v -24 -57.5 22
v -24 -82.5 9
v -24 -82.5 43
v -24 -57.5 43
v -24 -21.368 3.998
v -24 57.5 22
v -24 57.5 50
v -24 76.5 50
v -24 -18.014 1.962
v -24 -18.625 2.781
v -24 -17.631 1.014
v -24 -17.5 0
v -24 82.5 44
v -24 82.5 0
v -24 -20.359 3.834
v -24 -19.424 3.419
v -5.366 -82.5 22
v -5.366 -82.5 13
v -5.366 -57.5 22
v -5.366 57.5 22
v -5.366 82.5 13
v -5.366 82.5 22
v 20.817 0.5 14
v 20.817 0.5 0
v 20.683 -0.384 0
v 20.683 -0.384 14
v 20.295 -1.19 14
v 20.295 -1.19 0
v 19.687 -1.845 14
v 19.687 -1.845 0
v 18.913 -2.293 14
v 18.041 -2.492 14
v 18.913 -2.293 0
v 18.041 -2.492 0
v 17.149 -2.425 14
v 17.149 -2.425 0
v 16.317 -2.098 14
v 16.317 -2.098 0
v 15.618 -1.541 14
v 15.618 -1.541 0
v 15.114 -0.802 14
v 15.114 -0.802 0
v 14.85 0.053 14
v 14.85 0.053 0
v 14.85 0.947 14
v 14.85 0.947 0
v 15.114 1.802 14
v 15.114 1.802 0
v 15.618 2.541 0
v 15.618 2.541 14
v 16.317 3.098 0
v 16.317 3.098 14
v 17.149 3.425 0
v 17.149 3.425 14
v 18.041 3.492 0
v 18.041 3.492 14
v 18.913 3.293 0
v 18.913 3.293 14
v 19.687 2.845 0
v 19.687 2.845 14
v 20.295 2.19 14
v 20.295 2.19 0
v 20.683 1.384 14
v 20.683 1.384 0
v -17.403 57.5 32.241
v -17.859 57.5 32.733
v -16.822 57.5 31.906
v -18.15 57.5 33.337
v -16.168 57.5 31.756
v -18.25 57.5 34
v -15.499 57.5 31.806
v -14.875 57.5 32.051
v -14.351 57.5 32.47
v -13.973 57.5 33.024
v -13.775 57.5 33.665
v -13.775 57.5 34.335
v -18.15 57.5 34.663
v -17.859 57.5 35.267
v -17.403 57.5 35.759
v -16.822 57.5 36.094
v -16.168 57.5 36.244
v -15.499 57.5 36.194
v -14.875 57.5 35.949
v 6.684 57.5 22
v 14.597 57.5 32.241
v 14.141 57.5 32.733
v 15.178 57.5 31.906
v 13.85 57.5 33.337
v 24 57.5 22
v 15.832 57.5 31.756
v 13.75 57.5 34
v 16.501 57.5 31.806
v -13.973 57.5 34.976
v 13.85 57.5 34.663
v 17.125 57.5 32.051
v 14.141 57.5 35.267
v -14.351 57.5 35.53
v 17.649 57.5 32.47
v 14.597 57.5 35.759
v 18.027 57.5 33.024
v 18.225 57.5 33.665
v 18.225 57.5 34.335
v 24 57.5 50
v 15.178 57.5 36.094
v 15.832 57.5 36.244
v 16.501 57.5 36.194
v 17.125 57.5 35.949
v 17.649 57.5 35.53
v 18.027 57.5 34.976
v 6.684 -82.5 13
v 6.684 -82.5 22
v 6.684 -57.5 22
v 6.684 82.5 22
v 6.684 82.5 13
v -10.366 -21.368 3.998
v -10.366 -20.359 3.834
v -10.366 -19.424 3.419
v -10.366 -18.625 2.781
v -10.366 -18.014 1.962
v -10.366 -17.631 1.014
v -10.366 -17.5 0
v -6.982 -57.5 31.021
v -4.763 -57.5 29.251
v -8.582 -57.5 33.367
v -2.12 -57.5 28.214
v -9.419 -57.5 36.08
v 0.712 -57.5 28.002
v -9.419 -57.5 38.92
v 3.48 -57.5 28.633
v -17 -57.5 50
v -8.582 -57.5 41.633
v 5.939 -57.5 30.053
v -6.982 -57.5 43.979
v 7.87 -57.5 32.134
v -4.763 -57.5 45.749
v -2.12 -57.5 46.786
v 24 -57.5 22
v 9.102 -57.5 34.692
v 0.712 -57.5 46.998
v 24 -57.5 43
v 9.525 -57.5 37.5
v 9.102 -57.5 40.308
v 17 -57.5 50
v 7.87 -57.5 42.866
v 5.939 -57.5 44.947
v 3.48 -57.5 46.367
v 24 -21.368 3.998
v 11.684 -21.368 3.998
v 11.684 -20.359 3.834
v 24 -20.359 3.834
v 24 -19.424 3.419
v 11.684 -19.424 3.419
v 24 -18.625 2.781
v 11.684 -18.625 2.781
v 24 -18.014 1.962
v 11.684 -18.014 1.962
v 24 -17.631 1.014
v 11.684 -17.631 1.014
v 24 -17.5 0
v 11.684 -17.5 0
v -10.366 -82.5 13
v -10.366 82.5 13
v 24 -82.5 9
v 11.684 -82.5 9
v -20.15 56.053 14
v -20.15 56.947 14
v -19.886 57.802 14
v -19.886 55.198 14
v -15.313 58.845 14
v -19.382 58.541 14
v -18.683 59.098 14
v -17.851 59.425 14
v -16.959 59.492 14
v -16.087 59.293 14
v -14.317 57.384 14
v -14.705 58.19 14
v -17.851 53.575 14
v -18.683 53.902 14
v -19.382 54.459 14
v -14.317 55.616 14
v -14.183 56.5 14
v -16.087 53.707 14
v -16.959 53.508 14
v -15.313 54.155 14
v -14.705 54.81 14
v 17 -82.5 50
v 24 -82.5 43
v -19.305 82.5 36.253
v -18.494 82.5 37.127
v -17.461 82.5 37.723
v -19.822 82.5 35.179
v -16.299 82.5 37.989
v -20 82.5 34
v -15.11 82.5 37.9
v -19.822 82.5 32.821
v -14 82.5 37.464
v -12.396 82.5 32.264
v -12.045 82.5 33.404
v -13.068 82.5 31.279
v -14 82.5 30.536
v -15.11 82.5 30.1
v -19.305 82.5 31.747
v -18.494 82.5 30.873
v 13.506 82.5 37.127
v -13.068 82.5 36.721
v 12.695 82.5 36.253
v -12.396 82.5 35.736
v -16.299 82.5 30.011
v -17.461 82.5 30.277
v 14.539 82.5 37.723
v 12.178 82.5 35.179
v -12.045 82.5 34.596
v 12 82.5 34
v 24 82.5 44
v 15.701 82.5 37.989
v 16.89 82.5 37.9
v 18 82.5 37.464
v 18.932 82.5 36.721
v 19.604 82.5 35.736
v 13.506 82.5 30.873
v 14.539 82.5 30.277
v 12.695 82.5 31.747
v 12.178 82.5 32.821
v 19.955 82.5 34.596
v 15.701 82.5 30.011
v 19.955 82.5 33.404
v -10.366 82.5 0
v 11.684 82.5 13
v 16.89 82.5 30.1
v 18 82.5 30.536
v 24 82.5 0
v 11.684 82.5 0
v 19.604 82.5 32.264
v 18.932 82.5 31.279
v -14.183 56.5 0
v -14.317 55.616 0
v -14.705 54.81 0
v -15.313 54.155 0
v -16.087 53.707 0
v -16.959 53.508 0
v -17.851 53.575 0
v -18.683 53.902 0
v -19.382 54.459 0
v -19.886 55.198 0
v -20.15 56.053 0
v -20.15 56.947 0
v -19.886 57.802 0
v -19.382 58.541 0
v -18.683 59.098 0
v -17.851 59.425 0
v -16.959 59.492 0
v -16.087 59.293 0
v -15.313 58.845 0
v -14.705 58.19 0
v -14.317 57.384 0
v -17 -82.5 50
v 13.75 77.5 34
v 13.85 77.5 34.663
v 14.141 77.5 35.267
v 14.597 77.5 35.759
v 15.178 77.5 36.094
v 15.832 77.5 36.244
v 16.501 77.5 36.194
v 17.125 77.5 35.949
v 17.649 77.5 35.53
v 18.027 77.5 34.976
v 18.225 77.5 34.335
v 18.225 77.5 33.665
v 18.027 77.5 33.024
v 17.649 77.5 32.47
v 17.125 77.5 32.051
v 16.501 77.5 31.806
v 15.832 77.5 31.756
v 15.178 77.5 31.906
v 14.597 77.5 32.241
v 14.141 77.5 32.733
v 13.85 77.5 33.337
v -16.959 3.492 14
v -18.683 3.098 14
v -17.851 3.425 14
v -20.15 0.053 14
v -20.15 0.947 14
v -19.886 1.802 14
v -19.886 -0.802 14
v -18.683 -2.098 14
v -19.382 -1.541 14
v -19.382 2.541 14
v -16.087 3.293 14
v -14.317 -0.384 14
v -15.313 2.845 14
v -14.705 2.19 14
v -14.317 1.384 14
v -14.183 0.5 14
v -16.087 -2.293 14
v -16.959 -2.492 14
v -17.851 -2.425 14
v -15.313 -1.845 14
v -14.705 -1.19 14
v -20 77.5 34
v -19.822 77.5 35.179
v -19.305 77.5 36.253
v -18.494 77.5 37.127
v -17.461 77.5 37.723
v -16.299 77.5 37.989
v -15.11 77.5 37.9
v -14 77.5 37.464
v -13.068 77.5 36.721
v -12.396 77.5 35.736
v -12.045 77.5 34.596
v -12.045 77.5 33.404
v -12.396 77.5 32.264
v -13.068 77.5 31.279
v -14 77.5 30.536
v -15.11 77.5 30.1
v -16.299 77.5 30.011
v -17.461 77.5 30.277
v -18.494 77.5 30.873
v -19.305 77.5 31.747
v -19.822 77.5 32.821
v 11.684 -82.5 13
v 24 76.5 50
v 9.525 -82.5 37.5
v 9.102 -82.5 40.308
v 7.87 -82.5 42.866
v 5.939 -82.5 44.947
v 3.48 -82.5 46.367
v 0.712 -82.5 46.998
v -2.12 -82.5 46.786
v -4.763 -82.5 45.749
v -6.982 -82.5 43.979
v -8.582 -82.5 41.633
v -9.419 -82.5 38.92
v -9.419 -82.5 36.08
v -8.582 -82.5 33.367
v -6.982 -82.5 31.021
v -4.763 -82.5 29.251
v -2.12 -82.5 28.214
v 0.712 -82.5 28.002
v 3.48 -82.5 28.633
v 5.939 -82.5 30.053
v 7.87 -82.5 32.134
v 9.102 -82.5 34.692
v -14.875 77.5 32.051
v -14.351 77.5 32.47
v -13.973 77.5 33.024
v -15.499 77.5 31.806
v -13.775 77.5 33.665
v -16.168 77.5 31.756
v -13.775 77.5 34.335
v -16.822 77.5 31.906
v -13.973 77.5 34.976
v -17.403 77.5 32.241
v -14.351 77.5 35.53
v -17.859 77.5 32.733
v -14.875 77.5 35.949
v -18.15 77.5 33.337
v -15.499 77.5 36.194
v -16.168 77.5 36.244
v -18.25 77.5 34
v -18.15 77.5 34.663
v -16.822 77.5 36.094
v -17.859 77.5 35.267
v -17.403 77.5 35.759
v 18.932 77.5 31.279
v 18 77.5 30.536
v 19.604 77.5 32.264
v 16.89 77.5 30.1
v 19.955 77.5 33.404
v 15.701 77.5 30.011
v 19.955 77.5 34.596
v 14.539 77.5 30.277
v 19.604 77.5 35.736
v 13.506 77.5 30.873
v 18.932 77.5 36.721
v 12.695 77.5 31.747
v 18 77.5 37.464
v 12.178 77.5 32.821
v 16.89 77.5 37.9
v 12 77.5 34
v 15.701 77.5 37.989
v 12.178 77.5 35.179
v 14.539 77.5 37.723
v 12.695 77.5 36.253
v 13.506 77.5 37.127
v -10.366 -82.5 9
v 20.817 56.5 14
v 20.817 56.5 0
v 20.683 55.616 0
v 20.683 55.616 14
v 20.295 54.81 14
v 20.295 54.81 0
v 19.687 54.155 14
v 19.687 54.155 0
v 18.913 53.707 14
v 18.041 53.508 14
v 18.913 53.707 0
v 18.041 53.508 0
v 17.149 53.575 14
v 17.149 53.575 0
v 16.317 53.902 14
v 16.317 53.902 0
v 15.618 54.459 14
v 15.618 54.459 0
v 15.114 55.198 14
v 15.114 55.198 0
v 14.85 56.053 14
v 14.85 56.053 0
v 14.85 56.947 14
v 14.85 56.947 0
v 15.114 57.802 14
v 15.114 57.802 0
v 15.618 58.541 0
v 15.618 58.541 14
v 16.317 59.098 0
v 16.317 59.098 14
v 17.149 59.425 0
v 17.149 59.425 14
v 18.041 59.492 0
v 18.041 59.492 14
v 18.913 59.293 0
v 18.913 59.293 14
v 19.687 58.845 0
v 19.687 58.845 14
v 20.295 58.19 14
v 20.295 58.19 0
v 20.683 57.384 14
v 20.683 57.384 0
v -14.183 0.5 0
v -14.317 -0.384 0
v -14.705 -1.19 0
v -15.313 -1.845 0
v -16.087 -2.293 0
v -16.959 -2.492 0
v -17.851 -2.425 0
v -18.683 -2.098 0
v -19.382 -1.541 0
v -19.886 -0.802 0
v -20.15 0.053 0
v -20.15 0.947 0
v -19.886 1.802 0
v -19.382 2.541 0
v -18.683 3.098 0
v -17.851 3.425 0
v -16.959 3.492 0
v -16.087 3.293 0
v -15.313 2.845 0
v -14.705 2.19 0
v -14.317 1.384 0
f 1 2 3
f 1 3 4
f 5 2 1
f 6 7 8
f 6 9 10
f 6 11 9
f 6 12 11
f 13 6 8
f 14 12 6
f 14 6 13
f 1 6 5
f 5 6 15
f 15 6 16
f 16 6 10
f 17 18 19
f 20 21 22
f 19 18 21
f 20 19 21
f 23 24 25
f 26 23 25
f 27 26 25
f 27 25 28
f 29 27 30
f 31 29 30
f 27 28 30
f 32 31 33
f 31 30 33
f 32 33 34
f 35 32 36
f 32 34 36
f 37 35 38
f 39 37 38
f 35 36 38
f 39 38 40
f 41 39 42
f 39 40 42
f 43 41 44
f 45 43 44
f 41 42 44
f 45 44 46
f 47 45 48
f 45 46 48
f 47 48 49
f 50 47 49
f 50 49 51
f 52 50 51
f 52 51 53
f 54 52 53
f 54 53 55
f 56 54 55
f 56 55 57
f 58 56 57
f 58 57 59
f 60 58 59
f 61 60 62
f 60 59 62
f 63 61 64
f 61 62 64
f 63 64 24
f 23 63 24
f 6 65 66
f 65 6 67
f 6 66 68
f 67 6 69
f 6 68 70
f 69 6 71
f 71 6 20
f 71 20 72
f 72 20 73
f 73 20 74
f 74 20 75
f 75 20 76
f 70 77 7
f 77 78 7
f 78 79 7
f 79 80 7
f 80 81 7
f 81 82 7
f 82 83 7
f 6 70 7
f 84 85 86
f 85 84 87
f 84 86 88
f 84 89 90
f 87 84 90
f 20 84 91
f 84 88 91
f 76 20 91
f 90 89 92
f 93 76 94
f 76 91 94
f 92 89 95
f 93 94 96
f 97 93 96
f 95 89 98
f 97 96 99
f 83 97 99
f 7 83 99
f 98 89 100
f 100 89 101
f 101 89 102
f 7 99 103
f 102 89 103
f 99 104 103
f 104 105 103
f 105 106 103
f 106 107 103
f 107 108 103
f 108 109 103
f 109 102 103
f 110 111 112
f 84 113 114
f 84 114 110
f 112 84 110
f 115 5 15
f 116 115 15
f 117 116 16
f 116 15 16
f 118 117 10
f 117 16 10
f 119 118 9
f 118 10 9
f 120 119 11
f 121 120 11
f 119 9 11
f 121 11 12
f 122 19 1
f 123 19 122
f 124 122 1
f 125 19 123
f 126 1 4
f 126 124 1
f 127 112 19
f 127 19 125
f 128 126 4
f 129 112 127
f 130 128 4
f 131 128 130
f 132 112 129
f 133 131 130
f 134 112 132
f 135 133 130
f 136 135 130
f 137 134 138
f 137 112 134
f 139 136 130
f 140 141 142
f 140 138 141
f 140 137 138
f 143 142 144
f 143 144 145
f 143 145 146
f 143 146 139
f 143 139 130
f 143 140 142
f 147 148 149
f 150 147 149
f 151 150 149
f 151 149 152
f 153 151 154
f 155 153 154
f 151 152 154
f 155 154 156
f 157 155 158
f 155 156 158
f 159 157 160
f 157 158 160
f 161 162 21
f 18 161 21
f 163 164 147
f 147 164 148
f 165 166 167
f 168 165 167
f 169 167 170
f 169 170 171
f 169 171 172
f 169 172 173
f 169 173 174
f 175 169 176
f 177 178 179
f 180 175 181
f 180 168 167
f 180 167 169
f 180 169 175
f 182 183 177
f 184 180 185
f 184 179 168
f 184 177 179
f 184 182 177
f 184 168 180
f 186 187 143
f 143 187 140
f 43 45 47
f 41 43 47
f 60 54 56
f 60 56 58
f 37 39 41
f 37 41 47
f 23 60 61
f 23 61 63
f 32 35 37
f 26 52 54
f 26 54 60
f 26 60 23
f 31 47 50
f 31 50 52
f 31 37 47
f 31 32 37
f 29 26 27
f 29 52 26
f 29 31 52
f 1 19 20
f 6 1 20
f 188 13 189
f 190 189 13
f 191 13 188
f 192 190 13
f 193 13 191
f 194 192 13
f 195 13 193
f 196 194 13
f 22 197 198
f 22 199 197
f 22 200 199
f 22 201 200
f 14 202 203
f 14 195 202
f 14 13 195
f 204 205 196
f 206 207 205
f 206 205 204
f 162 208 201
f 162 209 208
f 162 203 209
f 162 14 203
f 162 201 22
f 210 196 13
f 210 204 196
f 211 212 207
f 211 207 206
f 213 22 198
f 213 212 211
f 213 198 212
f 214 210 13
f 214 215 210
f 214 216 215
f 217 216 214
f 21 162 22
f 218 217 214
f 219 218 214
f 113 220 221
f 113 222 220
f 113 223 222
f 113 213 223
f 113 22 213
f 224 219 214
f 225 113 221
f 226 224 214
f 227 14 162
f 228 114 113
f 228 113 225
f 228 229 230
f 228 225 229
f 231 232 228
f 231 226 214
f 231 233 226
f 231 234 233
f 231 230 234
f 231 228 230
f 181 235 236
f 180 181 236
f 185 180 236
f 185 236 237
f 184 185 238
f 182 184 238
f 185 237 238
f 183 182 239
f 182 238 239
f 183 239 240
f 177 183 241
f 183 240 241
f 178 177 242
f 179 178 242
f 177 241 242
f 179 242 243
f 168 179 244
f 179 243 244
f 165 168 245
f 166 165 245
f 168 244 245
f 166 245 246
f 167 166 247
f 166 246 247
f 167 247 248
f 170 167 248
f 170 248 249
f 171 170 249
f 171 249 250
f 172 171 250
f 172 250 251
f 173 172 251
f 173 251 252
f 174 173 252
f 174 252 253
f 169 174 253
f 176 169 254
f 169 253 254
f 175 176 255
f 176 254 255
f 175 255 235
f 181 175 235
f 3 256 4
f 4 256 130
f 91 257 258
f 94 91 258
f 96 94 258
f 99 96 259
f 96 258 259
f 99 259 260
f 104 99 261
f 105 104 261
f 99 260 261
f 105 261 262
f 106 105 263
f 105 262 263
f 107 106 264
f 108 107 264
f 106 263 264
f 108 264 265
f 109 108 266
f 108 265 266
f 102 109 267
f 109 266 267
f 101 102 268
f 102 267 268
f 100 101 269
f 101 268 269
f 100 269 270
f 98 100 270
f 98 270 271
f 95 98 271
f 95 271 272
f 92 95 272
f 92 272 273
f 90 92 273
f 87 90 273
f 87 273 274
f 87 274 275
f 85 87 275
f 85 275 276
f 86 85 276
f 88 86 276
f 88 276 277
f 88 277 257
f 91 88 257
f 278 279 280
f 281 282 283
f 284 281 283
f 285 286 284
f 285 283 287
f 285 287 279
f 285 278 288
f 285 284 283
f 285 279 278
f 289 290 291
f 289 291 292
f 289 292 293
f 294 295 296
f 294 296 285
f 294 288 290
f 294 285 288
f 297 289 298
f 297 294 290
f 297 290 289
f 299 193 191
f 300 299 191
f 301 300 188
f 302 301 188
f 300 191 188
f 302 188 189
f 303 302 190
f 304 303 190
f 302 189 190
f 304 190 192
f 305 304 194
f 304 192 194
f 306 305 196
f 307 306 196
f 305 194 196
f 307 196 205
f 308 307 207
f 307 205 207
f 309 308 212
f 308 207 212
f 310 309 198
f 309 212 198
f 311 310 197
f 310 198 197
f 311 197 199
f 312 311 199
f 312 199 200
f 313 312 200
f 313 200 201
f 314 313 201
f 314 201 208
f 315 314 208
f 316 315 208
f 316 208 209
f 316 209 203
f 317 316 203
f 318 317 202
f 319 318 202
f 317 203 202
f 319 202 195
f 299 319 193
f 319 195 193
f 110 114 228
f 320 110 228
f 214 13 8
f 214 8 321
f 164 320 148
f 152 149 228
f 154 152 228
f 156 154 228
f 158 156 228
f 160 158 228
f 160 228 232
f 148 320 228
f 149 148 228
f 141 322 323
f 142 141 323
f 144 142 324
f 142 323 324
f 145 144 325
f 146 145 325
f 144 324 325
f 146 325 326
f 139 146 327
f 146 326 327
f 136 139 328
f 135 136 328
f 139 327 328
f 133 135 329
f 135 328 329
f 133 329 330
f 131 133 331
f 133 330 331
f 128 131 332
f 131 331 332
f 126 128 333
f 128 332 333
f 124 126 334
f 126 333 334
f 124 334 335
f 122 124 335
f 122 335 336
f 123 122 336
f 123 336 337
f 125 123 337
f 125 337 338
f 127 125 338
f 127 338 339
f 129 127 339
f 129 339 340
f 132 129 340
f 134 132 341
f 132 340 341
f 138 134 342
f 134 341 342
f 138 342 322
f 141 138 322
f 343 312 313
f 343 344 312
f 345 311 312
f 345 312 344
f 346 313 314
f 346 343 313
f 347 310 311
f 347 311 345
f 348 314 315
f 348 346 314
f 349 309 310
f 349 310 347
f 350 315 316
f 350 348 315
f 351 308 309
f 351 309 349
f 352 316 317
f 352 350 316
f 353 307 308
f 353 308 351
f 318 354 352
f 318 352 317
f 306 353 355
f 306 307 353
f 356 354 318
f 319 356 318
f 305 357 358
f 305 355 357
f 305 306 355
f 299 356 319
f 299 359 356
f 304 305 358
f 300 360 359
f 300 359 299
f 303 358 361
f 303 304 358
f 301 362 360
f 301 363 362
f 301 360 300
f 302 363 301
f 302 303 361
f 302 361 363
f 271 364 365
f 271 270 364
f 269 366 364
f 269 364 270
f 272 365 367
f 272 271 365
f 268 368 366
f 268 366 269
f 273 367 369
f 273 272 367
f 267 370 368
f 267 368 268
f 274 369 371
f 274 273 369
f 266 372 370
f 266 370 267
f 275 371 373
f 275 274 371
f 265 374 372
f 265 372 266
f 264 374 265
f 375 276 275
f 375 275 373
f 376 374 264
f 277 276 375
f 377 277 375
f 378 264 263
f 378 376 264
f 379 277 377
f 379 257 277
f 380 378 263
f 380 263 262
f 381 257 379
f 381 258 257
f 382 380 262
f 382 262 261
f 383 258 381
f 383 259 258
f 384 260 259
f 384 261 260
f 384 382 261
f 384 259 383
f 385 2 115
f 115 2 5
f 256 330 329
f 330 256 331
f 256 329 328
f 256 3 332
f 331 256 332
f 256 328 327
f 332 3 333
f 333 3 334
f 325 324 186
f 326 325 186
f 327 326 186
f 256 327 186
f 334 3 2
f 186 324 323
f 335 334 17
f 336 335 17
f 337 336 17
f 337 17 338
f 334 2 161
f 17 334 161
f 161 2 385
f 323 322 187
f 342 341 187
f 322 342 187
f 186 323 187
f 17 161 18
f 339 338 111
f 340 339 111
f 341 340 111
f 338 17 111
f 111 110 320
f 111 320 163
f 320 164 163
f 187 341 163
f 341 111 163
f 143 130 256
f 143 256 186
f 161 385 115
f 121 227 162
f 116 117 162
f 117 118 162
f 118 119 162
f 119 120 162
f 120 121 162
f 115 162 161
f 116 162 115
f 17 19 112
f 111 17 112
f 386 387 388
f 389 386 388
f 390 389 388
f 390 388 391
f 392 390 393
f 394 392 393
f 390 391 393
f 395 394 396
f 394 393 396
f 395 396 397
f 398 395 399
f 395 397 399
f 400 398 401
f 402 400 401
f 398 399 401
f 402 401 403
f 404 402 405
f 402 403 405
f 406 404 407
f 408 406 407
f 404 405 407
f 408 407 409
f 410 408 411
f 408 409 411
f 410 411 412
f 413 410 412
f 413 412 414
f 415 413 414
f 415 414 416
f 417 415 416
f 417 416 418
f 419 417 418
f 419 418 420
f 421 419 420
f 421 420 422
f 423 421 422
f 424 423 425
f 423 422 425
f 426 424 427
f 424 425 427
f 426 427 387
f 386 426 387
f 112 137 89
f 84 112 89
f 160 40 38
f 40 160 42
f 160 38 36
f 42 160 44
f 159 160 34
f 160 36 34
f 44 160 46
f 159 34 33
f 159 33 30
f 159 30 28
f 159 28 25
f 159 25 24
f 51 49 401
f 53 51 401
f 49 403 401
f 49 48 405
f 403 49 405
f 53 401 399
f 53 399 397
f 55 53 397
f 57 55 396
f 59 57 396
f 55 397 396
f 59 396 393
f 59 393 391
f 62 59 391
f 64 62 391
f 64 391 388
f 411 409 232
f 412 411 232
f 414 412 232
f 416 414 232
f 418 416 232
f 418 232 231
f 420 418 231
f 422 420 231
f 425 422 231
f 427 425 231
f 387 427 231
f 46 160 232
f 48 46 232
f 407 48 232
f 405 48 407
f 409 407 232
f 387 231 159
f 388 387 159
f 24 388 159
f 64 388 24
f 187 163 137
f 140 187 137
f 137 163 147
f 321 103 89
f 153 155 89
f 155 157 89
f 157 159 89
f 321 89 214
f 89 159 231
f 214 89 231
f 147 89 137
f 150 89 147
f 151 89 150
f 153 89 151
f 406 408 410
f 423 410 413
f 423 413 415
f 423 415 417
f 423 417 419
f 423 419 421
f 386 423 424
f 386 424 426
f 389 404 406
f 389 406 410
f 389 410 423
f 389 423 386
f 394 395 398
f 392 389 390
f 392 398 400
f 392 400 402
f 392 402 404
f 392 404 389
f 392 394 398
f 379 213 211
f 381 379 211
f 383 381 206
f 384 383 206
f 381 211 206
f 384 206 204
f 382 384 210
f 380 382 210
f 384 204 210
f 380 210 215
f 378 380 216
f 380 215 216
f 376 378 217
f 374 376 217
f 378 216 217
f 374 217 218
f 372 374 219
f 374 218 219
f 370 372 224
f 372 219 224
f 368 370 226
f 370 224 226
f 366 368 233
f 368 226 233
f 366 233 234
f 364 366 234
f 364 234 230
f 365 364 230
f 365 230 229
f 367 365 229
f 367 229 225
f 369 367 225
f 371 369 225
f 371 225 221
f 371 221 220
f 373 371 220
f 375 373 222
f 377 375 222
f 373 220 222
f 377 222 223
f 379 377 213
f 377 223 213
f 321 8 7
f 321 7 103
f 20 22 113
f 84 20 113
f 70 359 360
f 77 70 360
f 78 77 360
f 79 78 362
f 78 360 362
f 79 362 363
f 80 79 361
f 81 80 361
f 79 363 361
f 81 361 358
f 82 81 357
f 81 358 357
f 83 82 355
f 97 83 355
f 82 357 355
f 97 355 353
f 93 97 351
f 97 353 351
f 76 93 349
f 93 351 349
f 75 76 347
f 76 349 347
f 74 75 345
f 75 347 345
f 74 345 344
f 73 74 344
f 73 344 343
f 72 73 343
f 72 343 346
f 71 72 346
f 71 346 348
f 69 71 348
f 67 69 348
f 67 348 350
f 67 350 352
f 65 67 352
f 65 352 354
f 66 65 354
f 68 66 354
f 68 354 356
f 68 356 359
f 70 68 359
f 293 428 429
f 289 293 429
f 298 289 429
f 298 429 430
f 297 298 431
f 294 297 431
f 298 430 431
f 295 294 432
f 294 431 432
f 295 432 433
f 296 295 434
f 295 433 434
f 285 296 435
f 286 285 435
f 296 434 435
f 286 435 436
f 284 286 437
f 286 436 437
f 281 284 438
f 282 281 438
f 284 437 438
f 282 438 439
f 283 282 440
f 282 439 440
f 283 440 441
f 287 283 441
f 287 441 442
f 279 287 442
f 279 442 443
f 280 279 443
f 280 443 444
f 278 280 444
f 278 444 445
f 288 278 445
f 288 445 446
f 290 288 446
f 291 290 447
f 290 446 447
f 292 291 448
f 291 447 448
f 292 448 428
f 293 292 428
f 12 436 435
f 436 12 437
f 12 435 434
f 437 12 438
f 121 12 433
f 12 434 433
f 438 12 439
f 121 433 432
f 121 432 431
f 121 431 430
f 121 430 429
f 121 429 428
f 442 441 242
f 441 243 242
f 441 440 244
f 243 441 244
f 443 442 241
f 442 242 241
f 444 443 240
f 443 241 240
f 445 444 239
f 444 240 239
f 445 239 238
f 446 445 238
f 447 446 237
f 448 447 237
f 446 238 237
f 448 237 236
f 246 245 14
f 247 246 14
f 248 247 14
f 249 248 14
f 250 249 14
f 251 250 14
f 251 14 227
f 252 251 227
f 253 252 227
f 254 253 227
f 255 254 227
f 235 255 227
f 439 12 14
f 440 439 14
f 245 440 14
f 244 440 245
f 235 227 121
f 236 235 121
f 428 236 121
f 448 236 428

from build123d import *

# Parameters (mm, degrees)
F0_W      = 48
F0_H      = 165
F1_DEPTH  = 50
F2_W      = 115
F2_H      = 28
F3_DEPTH  = 48
F4_R      = 9.525
F5_DEPTH  = 25
F6_SIZE   = 7
F7_SIZE   = 6
F9_DEPTH  = 165
F10_R     = 2.25
F11_DEPTH = 25
F10_R_2   = 4
F12_DEPTH = 5
F14_DEPTH = 48
F15_R     = 3
F16_DEPTH = 14


with BuildPart() as f1:
    # F0 (on Top) → F1 (new body)
    with BuildSketch(Plane.XY):
        Rectangle(F0_W, F0_H)
    extrude(amount=F1_DEPTH)

    # F2 (on face) → F3 (cut)
    with BuildSketch(Plane.YZ.offset(24)):
        with Locations((0, 36)):
            Rectangle(F2_W, F2_H)
    extrude(amount=-F3_DEPTH, mode=Mode.SUBTRACT)

    # F4 (on face) → F5 (cut)
    with BuildSketch(Plane.XZ.offset(82.5)):
        with Locations((0, 37.5)):
            Circle(F4_R)
    extrude(amount=-F5_DEPTH, mode=Mode.SUBTRACT)

    # F6
    f6_edges = [f1.edges().sort_by_distance(p)[0] for p in [
        (-24, -70, 50),
        (24, -70, 50),
    ]]
    chamfer(f6_edges, length=F6_SIZE)

    # F7
    f7_edges = [f1.edges().sort_by_distance(p)[0] for p in [
        (0, 82.5, 50),
    ]]
    chamfer(f7_edges, length=F7_SIZE)

    # F8 (on face) → F9 (cut)
    with BuildSketch(Plane(origin=(0, 82.5, 0), x_dir=(-1, 0, 0), z_dir=(0, 1, 0))):
        Polygon((-11.6835255176, 0), (0, 0), (10.3664744824, 0), (10.3664744824, 13), (5.3664744824, 13), (5.3664744824, 22), (-6.6835255176, 22), (-6.6835255176, 13), (-11.6835255176, 13), align=None)
    extrude(amount=-F9_DEPTH, mode=Mode.SUBTRACT)

    # F10 (on face) → F11 (cut)
    with BuildSketch(Plane(origin=(0, 82.5, 0), x_dir=(-1, 0, 0), z_dir=(0, 1, 0))):
        with Locations((16, 34)):
            Circle(F10_R)
        with Locations((-16, 34)):
            Circle(F10_R)
    extrude(amount=-F11_DEPTH, mode=Mode.SUBTRACT)

    # F10 (on face) → F12 (cut)
    with BuildSketch(Plane(origin=(0, 82.5, 0), x_dir=(-1, 0, 0), z_dir=(0, 1, 0))):
        with Locations((-16, 34)):
            Circle(F10_R_2)
        with Locations((-16, 34)):
            Circle(F10_R, mode=Mode.SUBTRACT)
        with Locations((16, 34)):
            Circle(F10_R_2)
        with Locations((16, 34)):
            Circle(F10_R, mode=Mode.SUBTRACT)
    extrude(amount=-F12_DEPTH, mode=Mode.SUBTRACT)

    # F13 (on face) → F14 (cut)
    with BuildSketch(Plane(origin=(-24, 0, 0), x_dir=(0, -1, 0), z_dir=(-1, 0, 0))):
        with BuildLine():
            Line((82.5, 9), (21.3676690006, 3.9978104641))
            ThreePointArc((21.3676690006, 3.9978104641), (18.6251674833, 2.781247562), (17.5, 0))
            Line((17.5, 0), (82.5, 0))
            Line((82.5, 0), (82.5, 9))
        make_face()
    extrude(amount=-F14_DEPTH, mode=Mode.SUBTRACT)

    # F15 (on face) → F16 (cut)
    with BuildSketch(Plane(origin=(0, 0, 0), x_dir=(1, 0, 0), z_dir=(0, 0, -1))):
        with Locations((-17.1832372412, -0.5)):
            Circle(F15_R)
        with Locations((-17.1832372412, -56.5)):
            Circle(F15_R)
        with Locations((17.8167627588, -56.5)):
            Circle(F15_R)
        with Locations((17.8167627588, -0.5)):
            Circle(F15_R)
    extrude(amount=-F16_DEPTH, mode=Mode.SUBTRACT)


solid = f1.part
